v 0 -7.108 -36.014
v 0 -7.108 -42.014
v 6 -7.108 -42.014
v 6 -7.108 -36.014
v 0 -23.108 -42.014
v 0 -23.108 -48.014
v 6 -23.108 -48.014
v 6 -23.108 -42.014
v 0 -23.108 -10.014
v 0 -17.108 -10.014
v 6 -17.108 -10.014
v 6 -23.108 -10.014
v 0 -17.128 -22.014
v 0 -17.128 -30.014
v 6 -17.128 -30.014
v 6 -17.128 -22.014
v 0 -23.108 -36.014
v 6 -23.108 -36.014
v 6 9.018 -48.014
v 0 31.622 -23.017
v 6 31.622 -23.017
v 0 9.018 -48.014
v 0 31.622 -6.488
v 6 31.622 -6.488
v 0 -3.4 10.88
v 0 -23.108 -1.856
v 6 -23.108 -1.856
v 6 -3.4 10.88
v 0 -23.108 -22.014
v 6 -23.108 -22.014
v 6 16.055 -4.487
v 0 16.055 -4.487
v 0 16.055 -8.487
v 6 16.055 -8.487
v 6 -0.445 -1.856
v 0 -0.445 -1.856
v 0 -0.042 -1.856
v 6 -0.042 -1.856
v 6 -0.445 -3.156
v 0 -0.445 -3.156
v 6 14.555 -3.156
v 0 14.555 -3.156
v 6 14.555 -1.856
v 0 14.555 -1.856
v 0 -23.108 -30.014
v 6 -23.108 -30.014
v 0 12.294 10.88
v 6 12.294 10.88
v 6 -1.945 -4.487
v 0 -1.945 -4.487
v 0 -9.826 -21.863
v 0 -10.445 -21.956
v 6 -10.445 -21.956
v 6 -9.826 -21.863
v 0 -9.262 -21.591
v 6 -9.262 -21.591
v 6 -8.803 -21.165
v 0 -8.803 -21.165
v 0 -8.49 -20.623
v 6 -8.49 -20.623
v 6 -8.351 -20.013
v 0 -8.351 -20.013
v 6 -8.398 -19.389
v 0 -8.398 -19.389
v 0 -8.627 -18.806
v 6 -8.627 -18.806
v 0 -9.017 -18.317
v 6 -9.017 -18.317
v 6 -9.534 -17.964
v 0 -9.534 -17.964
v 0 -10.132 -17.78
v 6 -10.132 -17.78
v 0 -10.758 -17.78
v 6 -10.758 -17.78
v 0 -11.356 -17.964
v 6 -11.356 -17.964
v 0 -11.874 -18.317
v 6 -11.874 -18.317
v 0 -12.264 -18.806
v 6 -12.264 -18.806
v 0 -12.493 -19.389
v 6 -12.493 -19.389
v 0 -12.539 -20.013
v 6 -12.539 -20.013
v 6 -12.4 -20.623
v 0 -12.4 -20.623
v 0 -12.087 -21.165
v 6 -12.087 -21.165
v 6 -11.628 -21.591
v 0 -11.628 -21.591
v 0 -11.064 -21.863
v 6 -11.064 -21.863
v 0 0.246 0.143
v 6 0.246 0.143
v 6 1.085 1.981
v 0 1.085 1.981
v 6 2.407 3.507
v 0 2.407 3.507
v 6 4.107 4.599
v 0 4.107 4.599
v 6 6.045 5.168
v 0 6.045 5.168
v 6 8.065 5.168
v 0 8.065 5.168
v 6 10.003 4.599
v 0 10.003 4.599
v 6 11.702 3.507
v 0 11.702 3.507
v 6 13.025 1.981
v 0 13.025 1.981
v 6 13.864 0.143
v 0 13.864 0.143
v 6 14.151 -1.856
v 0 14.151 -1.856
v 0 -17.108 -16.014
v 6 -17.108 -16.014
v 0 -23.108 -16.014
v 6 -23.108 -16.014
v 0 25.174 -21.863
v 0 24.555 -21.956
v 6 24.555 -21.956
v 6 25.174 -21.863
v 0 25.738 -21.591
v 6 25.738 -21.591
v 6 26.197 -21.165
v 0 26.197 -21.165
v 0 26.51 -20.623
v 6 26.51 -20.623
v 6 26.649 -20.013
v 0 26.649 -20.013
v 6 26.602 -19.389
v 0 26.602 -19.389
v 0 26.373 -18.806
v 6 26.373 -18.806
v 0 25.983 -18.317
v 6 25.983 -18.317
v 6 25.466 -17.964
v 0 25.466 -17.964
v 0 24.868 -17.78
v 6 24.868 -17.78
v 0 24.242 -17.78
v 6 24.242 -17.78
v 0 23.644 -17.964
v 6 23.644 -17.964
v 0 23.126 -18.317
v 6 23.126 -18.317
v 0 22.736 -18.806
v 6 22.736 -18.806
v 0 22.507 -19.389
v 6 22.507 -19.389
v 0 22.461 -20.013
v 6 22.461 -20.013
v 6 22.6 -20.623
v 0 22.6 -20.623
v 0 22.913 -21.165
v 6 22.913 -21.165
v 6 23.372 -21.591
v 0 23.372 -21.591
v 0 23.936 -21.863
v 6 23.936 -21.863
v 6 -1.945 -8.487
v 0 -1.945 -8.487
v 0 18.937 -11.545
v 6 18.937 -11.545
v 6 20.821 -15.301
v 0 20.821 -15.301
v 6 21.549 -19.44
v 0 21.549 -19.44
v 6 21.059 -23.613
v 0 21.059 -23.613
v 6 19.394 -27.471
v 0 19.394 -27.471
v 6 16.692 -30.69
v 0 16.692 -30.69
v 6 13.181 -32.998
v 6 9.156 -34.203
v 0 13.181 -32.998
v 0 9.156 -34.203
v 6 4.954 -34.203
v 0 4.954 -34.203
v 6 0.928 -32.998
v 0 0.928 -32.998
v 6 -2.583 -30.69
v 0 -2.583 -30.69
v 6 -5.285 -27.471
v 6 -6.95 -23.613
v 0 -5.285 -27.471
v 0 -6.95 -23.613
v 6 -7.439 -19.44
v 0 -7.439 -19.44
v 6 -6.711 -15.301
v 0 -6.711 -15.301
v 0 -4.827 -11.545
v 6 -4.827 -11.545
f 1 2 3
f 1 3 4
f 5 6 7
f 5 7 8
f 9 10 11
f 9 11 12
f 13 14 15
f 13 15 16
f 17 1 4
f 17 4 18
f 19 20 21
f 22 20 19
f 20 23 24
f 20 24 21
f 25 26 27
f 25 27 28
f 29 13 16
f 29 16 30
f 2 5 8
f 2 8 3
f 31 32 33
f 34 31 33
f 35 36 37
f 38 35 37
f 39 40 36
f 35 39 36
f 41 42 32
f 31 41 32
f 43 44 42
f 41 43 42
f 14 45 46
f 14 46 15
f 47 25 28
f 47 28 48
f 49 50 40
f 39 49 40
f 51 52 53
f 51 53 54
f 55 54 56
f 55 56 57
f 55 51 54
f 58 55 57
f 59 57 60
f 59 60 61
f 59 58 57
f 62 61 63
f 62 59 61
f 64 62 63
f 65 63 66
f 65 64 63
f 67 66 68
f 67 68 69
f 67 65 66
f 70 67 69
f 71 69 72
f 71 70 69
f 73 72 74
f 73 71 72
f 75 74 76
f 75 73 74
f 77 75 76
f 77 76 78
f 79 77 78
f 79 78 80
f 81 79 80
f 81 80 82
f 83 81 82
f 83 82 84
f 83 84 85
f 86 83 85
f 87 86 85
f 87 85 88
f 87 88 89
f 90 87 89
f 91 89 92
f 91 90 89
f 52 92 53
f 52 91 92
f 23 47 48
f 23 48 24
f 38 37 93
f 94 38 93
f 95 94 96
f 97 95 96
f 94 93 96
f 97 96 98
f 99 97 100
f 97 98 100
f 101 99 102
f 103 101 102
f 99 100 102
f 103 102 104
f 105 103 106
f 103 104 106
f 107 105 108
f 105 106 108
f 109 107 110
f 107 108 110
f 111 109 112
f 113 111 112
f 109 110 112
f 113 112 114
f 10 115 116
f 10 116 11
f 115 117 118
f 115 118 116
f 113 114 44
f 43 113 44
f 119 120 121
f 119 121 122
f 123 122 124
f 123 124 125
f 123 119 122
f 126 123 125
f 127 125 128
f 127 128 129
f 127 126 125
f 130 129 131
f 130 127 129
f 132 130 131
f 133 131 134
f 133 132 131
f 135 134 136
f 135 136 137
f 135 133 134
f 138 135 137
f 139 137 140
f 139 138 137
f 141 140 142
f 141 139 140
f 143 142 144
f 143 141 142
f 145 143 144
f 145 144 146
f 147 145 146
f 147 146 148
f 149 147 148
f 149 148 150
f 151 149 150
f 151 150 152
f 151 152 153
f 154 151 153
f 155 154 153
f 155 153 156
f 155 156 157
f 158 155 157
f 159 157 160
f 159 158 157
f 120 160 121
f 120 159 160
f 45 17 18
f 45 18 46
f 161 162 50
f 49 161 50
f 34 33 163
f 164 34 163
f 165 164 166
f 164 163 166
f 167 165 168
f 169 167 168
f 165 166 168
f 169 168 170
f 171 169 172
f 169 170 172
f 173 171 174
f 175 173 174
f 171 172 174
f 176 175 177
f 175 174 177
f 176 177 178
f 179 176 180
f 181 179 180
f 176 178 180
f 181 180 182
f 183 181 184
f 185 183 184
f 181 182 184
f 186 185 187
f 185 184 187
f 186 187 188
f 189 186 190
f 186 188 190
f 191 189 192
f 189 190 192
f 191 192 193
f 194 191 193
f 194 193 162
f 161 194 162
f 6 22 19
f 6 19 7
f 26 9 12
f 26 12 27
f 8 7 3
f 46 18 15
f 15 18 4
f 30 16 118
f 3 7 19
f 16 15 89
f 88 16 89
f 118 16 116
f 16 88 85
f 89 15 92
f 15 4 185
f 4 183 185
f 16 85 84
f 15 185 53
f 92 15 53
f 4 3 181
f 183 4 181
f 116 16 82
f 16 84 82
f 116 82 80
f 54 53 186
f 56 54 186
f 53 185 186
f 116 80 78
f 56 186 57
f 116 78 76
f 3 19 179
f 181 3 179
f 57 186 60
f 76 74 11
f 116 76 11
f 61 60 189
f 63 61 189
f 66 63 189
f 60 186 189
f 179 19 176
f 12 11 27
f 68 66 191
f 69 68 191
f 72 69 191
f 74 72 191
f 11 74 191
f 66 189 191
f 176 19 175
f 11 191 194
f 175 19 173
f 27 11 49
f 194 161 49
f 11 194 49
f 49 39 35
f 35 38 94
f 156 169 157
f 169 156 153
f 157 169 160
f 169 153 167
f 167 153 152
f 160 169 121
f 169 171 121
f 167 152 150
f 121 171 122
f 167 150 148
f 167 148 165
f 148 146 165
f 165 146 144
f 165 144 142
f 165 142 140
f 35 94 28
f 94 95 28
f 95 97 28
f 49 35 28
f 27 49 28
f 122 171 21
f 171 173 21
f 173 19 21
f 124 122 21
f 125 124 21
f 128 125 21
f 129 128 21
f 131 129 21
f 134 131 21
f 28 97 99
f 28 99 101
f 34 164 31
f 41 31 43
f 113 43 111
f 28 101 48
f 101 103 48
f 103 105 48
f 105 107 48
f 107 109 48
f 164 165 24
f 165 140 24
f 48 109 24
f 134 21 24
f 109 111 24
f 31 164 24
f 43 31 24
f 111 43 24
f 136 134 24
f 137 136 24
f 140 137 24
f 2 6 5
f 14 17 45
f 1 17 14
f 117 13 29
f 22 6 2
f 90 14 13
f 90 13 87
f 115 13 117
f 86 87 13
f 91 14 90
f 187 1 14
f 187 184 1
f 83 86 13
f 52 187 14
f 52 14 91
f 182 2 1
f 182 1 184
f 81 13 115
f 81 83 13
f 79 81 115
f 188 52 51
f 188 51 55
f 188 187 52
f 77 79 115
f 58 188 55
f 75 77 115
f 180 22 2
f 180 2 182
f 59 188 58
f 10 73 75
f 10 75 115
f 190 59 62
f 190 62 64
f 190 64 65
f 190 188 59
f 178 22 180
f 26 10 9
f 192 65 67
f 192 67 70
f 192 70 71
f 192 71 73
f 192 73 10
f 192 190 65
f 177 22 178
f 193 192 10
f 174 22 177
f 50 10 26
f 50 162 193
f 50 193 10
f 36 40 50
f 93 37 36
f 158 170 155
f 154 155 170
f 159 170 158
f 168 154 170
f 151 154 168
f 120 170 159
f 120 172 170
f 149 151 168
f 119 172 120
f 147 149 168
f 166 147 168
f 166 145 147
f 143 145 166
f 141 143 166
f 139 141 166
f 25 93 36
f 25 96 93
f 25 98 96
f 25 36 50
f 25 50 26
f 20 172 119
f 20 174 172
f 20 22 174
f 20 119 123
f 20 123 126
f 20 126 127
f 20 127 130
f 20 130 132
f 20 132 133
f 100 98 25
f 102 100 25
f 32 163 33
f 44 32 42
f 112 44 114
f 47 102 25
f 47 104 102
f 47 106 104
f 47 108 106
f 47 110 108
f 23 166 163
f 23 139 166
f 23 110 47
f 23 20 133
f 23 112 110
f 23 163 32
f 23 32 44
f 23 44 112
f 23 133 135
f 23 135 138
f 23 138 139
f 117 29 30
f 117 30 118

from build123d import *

# Parameters (mm, degrees)
SKETCH1_R           = 2.1
BOSS_EXTRUDE1_DEPTH = 6


with BuildPart() as part:
    # Sketch1 → Boss-Extrude1 (new body)
    with BuildSketch(Plane(origin=(0, 0, 0), x_dir=(0, 0, -1), z_dir=(1, 0, 0))):
        Polygon((1.8561273, -23.10816726), (10.014395287, -23.10816726), (10.014395287, -17.10816726), (16.014395287, -17.10816726), (16.014395287, -23.10816726), (22.014395287, -23.10816726), (22.014395287, -17.128409951), (30.014395287, -17.128409951), (30.014395287, -23.10816726), (36.014395287, -23.10816726), (36.014395287, -7.10816726), (42.014395287, -7.10816726), (42.014395287, -23.10816726), (48.014395287, -23.10816726), (48.014395287, 9.017628036), (23.016962848, 31.621864486), (6.488451552, 31.621864486), (-10.880328259, 12.294369708), (-10.880328259, -3.400467914), align=None)
        with Locations((19.8561273, -10.445316887)):
            Circle(SKETCH1_R, mode=Mode.SUBTRACT)
        with BuildLine():
            Line((8.487310299, -1.945316887), (4.487310299, -1.945316887))
            Line((4.487310299, -1.945316887), (3.1561273, -0.445316887))
            Line((3.1561273, -0.445316887), (1.8561273, -0.445316887))
            Line((1.8561273, -0.445316887), (1.8561273, -0.041769088))
            ThreePointArc((1.8561273, -0.041769088), (-5.240324902, 7.054683113), (1.8561273, 14.151135315))
            Line((1.8561273, 14.151135315), (1.8561273, 14.554683113))
            Line((1.8561273, 14.554683113), (3.1561273, 14.554683113))
            Line((3.1561273, 14.554683113), (4.487310299, 16.054683113))
            Line((4.487310299, 16.054683113), (8.487310299, 16.054683113))
            ThreePointArc((8.487310299, 16.054683113), (34.3561273, 7.054683113), (8.487310299, -1.945316887))
        make_face(mode=Mode.SUBTRACT)
        with Locations((19.8561273, 24.554683113)):
            Circle(SKETCH1_R, mode=Mode.SUBTRACT)
    extrude(amount=BOSS_EXTRUDE1_DEPTH)


solid = part.part
